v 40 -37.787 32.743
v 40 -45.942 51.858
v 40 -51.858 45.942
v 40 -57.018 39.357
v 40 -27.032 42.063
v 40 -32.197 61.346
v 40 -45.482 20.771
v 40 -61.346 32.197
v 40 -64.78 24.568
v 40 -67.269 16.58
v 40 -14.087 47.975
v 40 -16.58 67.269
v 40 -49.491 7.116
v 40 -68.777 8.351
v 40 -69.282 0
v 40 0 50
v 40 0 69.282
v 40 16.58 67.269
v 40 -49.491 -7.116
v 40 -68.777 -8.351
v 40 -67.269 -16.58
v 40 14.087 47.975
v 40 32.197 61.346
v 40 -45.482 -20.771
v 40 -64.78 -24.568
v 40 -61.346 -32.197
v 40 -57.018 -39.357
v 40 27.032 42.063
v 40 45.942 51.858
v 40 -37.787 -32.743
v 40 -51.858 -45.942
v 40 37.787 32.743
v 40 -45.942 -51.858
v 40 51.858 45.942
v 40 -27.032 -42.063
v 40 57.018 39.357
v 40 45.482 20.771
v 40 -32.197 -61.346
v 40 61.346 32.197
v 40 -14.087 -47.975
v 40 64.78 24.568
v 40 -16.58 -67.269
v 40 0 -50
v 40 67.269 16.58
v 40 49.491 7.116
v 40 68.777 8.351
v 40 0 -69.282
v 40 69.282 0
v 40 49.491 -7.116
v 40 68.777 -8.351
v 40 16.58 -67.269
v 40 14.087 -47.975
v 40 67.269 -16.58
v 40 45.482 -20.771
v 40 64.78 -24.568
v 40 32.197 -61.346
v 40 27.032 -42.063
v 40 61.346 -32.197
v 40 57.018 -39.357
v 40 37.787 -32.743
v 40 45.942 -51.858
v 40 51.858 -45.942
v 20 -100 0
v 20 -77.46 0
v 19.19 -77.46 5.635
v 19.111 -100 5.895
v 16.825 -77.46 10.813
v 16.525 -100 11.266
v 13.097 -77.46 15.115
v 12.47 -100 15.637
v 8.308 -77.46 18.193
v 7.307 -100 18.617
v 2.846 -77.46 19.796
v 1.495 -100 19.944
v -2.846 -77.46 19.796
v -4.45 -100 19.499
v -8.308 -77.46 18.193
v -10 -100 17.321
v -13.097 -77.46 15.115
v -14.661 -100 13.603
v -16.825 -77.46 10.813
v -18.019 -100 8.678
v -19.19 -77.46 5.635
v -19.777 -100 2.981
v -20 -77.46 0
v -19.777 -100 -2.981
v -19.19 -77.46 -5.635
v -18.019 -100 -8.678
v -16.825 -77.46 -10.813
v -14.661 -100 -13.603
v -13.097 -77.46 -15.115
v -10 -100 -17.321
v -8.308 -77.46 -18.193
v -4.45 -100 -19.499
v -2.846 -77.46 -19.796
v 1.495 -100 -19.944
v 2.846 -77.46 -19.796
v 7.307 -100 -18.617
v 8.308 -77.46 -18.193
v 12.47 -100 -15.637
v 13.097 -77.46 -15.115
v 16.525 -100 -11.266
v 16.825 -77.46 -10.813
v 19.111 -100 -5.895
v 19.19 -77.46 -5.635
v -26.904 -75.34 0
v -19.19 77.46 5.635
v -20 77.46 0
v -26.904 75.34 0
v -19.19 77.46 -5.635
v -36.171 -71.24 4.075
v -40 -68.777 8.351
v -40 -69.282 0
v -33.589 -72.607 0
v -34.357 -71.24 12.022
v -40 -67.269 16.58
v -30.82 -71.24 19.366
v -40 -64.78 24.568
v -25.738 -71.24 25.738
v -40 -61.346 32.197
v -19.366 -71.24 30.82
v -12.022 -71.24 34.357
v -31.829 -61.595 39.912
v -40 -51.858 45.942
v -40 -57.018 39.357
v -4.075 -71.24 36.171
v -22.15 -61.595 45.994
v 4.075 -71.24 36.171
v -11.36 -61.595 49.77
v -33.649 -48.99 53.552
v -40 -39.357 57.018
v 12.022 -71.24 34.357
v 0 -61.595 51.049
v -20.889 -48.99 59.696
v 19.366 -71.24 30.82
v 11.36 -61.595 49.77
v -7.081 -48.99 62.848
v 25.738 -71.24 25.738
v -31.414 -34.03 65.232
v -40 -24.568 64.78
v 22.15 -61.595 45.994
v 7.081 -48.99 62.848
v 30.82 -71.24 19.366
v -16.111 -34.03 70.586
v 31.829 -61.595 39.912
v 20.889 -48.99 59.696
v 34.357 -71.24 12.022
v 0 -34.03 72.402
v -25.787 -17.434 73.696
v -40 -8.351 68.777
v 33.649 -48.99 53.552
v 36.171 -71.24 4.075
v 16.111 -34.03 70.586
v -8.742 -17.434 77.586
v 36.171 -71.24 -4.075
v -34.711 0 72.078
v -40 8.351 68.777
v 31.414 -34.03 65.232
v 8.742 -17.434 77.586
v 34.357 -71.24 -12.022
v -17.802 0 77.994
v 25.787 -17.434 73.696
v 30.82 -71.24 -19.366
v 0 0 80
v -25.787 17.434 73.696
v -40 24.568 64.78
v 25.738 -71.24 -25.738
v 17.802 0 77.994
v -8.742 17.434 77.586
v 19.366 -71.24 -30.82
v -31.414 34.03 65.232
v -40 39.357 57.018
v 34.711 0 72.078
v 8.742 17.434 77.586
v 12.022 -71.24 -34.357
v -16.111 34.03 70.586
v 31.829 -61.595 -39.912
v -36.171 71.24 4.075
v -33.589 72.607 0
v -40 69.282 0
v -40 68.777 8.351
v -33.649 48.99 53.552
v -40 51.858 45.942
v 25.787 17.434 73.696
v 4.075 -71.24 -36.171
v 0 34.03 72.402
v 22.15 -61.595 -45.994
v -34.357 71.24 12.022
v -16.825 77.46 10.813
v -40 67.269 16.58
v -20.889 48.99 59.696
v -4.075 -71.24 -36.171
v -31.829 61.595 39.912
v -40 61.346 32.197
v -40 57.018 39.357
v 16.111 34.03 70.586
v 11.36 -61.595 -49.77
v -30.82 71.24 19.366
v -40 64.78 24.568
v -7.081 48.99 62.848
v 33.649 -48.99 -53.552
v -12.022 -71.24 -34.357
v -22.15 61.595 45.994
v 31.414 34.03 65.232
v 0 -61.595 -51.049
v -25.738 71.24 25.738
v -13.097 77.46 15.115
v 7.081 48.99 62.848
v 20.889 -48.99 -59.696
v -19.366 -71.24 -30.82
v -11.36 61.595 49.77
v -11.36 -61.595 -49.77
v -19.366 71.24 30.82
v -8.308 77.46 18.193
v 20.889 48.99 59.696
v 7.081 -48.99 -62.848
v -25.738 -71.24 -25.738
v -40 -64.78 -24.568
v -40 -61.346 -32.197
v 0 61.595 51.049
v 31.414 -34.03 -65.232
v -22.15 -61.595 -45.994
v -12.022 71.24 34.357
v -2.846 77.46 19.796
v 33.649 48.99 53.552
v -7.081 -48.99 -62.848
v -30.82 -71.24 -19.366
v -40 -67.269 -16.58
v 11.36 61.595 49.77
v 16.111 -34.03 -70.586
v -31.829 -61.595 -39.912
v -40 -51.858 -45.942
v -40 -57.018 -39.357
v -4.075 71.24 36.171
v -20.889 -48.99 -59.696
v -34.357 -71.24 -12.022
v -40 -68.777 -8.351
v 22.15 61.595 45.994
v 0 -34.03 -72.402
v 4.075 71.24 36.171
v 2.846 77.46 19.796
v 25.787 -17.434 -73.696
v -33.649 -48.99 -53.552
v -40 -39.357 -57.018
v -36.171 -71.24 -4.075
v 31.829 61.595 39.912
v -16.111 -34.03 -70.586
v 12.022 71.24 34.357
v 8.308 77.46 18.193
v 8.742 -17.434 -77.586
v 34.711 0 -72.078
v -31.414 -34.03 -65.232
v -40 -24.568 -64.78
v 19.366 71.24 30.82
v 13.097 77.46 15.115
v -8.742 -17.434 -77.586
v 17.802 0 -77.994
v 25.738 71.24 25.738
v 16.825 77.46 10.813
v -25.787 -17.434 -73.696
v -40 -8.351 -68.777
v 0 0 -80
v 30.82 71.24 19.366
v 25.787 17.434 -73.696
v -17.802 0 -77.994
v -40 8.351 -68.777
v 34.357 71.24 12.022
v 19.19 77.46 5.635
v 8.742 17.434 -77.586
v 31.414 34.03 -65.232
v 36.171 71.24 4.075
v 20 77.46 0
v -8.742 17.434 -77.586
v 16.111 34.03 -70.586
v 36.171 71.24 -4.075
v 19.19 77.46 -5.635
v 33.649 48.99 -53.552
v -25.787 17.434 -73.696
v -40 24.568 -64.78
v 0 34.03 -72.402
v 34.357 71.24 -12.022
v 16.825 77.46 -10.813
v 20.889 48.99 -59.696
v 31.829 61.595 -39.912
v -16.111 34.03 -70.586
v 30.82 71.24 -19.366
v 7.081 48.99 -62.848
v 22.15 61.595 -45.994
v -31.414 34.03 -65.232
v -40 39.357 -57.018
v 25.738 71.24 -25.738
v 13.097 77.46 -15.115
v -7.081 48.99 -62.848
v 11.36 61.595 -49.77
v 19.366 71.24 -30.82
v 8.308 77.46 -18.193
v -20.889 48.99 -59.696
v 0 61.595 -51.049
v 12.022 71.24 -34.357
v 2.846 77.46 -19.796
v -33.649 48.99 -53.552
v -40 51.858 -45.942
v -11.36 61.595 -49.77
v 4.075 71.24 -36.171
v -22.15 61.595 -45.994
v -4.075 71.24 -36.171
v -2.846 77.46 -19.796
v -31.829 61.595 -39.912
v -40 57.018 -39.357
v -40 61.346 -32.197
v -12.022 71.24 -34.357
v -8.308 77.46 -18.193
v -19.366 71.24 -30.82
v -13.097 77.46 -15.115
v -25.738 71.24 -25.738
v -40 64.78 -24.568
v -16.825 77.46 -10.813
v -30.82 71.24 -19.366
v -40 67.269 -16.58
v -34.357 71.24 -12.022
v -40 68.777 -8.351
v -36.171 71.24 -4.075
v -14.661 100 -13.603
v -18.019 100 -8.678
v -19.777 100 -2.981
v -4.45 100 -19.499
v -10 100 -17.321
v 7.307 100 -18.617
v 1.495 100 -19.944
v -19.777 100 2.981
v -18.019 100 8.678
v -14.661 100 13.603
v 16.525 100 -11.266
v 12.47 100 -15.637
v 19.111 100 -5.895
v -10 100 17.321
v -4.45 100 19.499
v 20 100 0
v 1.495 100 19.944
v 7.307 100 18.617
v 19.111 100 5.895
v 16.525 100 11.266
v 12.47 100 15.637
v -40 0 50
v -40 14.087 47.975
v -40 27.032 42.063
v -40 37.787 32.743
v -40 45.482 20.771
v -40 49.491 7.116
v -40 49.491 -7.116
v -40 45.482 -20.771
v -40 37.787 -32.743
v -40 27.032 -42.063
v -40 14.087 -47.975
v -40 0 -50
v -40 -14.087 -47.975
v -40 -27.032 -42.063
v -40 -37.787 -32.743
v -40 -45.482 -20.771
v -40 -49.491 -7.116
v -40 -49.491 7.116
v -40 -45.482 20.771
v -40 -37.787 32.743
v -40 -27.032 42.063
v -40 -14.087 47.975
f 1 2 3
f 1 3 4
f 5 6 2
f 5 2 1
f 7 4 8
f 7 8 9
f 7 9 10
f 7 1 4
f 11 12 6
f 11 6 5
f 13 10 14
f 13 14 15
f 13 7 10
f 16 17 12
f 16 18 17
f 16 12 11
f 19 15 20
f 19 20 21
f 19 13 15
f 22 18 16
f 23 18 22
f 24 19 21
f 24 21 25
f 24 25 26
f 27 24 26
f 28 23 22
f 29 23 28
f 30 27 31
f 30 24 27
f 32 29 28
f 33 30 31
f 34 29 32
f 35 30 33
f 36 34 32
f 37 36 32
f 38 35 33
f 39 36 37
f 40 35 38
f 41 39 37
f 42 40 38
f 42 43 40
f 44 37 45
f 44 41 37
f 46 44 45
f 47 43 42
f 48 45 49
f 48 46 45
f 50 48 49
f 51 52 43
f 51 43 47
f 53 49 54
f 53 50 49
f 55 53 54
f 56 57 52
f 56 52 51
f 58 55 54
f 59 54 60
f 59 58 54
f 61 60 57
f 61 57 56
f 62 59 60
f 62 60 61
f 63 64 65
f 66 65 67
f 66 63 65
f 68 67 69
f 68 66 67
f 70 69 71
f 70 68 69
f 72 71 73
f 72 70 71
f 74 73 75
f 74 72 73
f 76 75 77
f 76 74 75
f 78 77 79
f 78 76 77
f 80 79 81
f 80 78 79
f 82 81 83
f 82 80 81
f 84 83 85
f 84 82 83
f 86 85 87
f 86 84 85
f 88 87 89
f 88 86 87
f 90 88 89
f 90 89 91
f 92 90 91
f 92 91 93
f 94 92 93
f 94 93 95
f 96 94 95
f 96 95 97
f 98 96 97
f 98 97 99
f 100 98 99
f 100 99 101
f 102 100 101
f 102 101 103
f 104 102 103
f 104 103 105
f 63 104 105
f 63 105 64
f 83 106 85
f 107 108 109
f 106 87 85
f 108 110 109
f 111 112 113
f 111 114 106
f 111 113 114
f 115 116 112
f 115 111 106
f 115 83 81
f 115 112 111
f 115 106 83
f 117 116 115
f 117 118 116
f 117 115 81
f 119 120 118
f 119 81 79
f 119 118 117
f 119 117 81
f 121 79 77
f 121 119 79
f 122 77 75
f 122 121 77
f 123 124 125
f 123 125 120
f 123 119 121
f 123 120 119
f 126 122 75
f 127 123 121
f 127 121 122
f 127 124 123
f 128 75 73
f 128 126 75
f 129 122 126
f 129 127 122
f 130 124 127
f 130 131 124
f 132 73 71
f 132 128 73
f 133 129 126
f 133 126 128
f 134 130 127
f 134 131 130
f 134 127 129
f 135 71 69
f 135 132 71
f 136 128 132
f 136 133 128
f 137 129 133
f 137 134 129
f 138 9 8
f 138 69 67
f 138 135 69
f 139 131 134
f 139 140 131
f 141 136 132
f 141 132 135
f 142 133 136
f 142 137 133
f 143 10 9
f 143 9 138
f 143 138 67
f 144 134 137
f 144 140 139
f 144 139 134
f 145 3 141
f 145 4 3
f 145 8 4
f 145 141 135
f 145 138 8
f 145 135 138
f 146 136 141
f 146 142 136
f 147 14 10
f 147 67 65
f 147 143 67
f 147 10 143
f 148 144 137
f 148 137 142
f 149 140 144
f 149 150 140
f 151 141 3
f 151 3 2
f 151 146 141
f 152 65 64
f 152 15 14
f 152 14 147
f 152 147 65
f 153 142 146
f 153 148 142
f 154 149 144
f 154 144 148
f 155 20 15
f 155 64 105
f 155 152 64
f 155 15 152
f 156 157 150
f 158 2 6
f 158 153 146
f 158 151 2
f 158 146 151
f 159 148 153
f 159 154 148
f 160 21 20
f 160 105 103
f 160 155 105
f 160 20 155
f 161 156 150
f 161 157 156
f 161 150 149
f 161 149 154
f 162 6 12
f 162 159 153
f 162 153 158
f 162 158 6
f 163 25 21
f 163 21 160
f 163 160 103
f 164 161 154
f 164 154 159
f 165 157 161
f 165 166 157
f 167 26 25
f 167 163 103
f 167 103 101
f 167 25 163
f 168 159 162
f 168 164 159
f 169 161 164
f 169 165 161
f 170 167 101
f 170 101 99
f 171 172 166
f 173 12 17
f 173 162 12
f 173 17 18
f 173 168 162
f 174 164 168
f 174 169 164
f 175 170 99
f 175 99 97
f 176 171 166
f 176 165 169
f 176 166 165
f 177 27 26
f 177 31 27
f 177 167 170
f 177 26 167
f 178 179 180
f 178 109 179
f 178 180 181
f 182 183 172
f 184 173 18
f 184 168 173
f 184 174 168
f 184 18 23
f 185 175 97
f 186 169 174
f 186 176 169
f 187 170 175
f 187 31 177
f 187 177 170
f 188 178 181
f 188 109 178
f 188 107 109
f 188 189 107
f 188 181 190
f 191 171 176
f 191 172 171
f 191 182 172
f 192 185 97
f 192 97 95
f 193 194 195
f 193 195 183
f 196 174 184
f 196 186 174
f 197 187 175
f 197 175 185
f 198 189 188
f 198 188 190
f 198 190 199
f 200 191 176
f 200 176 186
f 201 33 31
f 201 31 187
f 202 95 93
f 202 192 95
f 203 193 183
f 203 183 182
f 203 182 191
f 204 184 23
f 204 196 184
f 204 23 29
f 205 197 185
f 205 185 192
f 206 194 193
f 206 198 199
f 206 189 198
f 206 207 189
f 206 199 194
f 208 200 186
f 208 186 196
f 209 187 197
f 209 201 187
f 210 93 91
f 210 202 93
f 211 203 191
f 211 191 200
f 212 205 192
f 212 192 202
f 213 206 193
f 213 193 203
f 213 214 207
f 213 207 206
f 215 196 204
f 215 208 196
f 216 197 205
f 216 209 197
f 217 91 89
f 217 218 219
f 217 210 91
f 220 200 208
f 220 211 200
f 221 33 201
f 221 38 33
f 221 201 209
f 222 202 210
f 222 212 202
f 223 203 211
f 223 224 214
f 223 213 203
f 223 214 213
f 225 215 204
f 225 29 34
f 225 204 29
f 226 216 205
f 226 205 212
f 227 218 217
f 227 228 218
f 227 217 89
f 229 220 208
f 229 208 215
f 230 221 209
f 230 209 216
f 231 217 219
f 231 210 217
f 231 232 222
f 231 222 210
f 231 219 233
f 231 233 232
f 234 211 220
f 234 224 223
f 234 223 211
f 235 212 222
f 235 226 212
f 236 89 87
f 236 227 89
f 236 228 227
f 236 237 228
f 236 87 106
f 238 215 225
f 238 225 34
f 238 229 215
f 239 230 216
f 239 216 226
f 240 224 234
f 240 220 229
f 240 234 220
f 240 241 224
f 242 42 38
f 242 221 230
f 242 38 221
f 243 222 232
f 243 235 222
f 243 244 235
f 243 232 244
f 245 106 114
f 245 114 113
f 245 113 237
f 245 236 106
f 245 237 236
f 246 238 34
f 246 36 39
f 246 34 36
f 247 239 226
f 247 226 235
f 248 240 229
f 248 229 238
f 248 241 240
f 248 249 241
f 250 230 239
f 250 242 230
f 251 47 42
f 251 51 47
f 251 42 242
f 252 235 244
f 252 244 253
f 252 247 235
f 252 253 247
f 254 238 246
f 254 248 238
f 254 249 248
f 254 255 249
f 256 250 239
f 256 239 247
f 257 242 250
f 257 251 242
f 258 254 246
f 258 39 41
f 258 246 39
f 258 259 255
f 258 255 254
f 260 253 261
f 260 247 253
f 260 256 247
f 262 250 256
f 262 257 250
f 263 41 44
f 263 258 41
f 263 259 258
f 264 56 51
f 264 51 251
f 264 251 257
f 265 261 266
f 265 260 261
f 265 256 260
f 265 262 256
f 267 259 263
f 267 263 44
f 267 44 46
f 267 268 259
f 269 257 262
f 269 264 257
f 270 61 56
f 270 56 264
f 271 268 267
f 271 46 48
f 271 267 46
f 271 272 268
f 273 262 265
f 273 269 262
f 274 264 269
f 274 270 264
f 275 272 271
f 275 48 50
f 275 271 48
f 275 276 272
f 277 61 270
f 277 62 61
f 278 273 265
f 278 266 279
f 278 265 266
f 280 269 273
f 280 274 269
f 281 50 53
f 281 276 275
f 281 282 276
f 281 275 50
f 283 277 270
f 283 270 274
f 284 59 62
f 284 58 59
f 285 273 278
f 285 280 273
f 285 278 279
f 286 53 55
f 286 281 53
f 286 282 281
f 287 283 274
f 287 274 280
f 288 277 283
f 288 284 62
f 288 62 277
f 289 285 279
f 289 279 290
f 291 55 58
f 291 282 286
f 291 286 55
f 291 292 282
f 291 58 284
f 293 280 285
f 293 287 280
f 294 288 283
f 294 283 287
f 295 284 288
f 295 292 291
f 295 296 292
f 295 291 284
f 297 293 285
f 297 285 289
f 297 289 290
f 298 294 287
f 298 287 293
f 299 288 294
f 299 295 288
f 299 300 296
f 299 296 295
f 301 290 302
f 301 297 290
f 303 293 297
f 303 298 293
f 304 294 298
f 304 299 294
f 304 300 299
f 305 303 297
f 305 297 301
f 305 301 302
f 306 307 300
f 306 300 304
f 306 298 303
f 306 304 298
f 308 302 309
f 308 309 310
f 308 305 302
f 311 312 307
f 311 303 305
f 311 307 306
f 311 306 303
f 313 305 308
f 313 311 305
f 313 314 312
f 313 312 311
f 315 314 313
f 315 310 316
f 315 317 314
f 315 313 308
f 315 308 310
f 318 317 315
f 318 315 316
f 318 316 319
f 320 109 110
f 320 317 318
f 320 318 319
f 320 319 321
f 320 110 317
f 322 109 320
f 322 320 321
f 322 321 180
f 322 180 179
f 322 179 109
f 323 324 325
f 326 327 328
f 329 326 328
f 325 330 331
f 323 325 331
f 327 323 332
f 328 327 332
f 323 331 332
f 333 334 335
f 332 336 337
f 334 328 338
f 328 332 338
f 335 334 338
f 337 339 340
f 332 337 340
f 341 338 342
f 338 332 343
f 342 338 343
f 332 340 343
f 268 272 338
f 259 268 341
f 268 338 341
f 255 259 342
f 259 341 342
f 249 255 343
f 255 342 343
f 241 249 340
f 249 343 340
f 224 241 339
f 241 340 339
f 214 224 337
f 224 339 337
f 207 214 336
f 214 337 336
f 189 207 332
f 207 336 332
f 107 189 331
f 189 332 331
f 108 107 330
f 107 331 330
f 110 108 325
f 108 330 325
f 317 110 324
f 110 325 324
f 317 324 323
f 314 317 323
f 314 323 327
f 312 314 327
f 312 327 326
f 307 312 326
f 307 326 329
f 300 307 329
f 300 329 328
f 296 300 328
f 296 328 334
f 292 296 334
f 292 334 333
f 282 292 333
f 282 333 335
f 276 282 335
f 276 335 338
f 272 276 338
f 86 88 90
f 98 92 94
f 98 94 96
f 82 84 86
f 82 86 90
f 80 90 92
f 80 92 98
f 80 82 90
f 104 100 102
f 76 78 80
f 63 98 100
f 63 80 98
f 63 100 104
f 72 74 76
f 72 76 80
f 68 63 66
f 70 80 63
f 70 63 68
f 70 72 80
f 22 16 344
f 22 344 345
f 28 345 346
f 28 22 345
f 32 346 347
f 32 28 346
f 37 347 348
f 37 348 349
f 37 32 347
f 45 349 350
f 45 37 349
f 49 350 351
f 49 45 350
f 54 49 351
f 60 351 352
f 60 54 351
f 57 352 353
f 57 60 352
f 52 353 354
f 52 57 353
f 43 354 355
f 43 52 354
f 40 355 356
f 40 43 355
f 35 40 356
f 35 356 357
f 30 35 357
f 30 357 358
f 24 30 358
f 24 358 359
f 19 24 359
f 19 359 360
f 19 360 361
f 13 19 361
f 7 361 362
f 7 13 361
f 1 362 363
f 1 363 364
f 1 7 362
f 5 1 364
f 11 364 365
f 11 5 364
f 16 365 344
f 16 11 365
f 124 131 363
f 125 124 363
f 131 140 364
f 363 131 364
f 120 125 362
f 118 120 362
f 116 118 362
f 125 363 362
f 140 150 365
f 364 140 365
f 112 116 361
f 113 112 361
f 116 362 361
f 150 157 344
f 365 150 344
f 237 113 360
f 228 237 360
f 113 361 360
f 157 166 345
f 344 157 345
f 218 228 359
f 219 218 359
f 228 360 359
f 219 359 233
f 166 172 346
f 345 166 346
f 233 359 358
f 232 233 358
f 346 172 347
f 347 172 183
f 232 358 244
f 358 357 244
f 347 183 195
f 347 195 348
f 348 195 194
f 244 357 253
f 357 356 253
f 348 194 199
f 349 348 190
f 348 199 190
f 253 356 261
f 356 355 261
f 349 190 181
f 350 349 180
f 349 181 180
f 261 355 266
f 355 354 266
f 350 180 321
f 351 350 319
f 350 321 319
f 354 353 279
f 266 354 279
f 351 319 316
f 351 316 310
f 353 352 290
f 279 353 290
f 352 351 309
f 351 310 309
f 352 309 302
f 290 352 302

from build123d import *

# Parameters (mm, degrees)
F0_W = 80
F0_H = 30
F5_R = 20


with BuildPart() as f1:
    # F0 (on Front) → F1 (revolve)
    with BuildSketch(Plane.XZ):
        with Locations((0, 65)):
            Rectangle(F0_W, F0_H)
    revolve(axis=Axis((-190.0887642899, 0, 0), (-1, 0, 0)))

    # F2 (on Top) → F3 (revolve, cut)
    with BuildSketch(Plane.XY):
        with BuildLine():
            ThreePointArc((0, -80), (-80, 0), (0, 80))
            Line((0, 80), (0, 110))
            Line((0, 110), (-110, 110))
            Line((-110, 110), (-110, -110))
            Line((-110, -110), (0, -110))
            Line((0, -110), (0, -80))
        make_face()
    revolve(axis=Axis((0, 23.6749413657, 0), (0, 1, 0)), mode=Mode.SUBTRACT)

    # F5 (on offset) → F6 (join, up to the next surface of F1)
    with BuildSketch(Plane.XZ.offset(100)):
        Circle(F5_R)
    extrude(until=Until.NEXT, dir=(0, 1, 0))

    # F7: F1 across plane


with BuildPart() as f1_1:
    add(f1.part)
    add(f1.part.mirror(Plane.XZ))


solid = f1_1.part
